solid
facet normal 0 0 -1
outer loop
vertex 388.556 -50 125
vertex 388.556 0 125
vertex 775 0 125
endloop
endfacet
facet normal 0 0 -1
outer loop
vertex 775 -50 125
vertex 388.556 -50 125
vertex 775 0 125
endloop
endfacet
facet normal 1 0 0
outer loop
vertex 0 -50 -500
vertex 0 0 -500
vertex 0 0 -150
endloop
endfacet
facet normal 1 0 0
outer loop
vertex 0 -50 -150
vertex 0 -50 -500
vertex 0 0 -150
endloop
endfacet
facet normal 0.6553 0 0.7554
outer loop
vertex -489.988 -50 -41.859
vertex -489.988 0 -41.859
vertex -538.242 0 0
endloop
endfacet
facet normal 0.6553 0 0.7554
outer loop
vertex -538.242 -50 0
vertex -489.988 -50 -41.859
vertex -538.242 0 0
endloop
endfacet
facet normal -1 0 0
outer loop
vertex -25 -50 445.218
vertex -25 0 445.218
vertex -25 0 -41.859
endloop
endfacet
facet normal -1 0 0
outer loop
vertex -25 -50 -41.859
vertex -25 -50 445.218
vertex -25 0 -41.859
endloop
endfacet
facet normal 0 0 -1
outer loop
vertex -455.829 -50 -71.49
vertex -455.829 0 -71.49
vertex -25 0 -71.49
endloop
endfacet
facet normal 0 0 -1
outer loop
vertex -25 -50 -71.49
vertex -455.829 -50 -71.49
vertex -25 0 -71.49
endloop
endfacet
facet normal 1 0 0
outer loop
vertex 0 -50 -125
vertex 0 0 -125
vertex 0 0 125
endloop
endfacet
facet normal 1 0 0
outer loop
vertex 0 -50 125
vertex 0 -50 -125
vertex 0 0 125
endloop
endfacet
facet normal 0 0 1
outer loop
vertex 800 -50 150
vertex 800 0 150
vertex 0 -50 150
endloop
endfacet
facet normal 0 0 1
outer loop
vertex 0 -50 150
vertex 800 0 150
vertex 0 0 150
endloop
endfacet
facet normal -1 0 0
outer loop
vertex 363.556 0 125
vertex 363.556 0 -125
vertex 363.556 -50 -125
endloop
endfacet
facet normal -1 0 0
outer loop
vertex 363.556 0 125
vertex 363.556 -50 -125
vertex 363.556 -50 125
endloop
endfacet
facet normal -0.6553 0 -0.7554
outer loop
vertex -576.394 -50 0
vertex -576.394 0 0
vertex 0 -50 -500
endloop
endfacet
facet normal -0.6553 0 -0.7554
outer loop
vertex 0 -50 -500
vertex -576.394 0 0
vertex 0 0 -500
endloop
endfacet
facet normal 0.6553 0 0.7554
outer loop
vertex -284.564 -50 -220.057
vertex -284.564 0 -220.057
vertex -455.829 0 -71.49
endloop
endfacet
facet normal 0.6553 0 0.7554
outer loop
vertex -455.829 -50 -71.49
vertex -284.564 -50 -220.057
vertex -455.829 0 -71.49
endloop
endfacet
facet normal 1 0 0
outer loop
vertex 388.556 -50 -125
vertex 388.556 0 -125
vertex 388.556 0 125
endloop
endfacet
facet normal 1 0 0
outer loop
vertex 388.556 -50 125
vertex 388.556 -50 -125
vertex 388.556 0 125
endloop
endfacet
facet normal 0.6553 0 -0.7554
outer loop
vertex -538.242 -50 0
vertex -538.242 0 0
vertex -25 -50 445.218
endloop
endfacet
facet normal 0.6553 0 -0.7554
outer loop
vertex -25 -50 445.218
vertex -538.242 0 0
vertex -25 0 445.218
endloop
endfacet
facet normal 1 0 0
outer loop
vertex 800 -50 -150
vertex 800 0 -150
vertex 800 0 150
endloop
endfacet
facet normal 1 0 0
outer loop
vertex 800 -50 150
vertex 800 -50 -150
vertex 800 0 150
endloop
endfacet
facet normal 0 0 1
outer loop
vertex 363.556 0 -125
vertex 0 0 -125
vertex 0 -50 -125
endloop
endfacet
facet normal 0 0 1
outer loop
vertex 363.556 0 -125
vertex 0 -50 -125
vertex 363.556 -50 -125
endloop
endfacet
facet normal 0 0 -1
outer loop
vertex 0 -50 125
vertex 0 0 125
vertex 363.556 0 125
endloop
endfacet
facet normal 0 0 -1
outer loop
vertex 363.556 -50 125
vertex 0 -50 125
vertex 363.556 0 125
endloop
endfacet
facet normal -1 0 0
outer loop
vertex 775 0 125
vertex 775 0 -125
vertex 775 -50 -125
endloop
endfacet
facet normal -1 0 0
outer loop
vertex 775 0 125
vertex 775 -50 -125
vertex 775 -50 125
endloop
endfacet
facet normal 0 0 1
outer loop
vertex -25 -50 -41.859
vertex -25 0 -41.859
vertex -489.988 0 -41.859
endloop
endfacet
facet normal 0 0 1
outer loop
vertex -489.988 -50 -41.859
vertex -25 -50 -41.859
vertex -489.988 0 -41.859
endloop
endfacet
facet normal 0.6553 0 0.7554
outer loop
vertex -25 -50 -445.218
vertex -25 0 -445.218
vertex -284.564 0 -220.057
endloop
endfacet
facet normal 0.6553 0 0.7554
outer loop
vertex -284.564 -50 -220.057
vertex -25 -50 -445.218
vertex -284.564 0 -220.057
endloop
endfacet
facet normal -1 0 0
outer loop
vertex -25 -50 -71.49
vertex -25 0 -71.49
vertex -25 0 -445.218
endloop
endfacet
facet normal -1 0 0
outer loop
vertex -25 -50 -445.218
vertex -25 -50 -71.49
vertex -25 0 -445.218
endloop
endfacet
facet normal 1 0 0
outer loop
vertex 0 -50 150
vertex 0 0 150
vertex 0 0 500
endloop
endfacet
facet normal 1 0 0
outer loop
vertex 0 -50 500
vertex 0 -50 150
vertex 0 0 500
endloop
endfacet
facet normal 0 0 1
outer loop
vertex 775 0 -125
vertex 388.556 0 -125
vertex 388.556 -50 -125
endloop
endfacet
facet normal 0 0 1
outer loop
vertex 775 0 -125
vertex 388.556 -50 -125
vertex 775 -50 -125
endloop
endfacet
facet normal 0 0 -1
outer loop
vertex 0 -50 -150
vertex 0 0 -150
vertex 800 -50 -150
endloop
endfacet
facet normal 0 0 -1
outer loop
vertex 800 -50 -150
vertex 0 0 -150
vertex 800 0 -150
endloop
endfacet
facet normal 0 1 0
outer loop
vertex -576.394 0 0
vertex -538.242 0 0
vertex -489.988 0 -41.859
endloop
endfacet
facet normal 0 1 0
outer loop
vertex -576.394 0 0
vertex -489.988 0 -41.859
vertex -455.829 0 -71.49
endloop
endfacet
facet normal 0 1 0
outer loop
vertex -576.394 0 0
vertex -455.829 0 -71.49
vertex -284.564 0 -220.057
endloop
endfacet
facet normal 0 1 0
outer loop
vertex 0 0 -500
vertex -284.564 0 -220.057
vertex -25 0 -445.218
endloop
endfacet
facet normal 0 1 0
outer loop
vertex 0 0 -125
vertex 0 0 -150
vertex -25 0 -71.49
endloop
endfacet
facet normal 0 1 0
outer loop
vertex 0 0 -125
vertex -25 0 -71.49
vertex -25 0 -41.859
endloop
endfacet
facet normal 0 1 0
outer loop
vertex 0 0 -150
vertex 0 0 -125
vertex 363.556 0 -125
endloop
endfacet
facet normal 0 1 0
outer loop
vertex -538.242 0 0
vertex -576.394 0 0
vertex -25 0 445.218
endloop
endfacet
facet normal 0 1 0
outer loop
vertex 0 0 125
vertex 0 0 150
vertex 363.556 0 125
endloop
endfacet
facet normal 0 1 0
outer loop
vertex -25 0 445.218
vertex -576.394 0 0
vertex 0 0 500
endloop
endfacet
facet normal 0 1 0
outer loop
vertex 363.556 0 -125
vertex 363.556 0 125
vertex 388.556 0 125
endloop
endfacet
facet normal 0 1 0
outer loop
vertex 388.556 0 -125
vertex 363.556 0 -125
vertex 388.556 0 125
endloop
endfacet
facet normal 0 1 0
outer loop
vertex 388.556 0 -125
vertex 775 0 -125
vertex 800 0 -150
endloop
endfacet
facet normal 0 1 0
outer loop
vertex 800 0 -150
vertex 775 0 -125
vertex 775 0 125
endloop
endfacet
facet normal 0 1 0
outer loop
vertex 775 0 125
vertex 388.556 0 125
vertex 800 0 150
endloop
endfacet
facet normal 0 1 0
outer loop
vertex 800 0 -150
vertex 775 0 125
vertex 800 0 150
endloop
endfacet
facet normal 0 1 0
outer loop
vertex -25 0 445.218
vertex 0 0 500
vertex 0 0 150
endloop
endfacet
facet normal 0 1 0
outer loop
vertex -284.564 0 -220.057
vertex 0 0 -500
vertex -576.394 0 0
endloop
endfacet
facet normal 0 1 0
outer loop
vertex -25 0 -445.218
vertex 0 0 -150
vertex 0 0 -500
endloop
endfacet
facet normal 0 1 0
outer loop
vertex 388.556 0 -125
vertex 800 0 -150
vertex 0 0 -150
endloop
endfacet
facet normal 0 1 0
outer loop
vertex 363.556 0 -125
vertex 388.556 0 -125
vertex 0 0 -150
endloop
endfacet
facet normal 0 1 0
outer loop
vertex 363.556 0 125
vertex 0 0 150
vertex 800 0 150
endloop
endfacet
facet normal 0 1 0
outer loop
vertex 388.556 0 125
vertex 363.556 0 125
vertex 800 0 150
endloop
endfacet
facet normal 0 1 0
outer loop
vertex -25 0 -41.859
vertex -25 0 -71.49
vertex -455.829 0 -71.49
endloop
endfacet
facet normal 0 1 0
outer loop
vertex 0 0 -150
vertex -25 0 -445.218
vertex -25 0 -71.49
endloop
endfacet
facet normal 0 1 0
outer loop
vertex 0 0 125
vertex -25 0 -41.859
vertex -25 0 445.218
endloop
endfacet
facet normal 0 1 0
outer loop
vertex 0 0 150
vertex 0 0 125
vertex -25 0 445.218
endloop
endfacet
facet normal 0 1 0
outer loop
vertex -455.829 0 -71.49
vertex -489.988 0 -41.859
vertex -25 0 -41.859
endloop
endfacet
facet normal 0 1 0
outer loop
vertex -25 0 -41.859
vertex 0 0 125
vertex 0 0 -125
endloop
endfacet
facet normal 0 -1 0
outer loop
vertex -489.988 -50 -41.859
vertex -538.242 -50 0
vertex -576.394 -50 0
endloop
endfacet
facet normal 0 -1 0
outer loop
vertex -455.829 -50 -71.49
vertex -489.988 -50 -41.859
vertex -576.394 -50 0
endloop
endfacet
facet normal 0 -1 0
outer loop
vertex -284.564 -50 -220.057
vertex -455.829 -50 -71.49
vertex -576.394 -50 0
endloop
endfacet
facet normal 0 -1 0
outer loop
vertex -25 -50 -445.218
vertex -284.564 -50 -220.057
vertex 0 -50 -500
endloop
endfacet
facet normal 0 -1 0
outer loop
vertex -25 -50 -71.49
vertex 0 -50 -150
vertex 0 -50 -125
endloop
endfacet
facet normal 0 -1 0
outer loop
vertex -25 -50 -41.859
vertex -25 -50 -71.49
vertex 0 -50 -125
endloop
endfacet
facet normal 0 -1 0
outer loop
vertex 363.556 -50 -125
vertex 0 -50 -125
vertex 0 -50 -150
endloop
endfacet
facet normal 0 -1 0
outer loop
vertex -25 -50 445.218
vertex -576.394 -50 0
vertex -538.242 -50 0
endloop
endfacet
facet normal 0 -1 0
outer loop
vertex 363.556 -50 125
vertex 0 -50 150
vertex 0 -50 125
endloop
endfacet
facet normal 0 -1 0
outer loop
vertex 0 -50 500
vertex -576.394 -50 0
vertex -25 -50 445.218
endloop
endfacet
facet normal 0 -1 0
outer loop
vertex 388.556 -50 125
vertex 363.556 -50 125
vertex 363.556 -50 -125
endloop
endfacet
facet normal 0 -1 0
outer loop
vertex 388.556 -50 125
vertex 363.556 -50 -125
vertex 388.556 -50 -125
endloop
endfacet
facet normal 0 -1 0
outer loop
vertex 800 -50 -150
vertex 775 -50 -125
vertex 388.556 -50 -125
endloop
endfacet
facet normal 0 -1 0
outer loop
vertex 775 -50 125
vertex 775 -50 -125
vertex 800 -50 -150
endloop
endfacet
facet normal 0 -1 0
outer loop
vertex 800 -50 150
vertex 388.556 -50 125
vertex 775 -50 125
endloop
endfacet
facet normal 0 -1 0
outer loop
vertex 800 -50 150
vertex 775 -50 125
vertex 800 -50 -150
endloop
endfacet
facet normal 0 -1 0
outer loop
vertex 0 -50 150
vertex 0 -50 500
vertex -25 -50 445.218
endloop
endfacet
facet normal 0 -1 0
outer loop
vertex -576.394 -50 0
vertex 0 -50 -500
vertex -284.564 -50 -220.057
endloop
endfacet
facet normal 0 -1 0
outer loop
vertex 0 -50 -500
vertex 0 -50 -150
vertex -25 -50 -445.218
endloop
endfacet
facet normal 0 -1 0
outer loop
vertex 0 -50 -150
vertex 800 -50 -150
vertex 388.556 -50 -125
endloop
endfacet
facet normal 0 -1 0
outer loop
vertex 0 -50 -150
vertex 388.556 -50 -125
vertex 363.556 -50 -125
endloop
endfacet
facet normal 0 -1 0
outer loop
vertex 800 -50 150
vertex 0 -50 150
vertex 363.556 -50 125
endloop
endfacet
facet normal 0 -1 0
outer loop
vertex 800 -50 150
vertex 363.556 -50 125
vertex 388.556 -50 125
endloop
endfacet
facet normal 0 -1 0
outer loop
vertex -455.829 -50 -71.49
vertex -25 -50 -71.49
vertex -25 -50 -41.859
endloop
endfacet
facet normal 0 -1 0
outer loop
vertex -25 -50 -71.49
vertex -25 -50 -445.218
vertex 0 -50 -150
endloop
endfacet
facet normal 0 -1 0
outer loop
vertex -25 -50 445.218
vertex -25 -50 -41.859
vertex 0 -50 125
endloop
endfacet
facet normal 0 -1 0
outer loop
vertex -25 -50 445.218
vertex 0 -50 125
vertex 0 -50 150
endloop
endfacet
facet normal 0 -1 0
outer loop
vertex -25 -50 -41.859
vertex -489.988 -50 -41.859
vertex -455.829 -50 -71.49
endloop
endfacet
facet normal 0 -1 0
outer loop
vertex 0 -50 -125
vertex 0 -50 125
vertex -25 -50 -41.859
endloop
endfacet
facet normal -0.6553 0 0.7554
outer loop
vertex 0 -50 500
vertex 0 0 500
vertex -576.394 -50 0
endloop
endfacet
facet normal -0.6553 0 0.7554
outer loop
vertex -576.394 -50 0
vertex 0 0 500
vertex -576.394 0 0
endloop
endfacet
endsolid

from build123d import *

# Parameters (mm, degrees)
F0_W     = 363.556385
F0_H     = 250
F0_W_2   = 386.443615
F1_DEPTH = 50


with BuildPart() as f1:
    # F0 (on Front) → F1 (new body)
    with BuildSketch(Plane.XZ):
        Polygon((0, 150), (0, 500), (-576.39432, 0), (0, -500), (0, -150), (800, -150), (800, 150), align=None)
        Polygon((-455.829133, -71.490273), (-25, -71.490273), (-25, -420.501658), (-25, -445.218048), (-284.563661, -220.056511), align=None, mode=Mode.SUBTRACT)
        Polygon((-25, 445.218048), (-25, -41.858591), (-455.829133, -41.858591), (-489.988199, -41.858591), (-538.242307, 0), align=None, mode=Mode.SUBTRACT)
        with Locations((181.778192, 0)):
            Rectangle(F0_W, F0_H, mode=Mode.SUBTRACT)
        with Locations((581.778192, 0)):
            Rectangle(F0_W_2, F0_H, mode=Mode.SUBTRACT)
    extrude(amount=F1_DEPTH)


solid = f1.part
